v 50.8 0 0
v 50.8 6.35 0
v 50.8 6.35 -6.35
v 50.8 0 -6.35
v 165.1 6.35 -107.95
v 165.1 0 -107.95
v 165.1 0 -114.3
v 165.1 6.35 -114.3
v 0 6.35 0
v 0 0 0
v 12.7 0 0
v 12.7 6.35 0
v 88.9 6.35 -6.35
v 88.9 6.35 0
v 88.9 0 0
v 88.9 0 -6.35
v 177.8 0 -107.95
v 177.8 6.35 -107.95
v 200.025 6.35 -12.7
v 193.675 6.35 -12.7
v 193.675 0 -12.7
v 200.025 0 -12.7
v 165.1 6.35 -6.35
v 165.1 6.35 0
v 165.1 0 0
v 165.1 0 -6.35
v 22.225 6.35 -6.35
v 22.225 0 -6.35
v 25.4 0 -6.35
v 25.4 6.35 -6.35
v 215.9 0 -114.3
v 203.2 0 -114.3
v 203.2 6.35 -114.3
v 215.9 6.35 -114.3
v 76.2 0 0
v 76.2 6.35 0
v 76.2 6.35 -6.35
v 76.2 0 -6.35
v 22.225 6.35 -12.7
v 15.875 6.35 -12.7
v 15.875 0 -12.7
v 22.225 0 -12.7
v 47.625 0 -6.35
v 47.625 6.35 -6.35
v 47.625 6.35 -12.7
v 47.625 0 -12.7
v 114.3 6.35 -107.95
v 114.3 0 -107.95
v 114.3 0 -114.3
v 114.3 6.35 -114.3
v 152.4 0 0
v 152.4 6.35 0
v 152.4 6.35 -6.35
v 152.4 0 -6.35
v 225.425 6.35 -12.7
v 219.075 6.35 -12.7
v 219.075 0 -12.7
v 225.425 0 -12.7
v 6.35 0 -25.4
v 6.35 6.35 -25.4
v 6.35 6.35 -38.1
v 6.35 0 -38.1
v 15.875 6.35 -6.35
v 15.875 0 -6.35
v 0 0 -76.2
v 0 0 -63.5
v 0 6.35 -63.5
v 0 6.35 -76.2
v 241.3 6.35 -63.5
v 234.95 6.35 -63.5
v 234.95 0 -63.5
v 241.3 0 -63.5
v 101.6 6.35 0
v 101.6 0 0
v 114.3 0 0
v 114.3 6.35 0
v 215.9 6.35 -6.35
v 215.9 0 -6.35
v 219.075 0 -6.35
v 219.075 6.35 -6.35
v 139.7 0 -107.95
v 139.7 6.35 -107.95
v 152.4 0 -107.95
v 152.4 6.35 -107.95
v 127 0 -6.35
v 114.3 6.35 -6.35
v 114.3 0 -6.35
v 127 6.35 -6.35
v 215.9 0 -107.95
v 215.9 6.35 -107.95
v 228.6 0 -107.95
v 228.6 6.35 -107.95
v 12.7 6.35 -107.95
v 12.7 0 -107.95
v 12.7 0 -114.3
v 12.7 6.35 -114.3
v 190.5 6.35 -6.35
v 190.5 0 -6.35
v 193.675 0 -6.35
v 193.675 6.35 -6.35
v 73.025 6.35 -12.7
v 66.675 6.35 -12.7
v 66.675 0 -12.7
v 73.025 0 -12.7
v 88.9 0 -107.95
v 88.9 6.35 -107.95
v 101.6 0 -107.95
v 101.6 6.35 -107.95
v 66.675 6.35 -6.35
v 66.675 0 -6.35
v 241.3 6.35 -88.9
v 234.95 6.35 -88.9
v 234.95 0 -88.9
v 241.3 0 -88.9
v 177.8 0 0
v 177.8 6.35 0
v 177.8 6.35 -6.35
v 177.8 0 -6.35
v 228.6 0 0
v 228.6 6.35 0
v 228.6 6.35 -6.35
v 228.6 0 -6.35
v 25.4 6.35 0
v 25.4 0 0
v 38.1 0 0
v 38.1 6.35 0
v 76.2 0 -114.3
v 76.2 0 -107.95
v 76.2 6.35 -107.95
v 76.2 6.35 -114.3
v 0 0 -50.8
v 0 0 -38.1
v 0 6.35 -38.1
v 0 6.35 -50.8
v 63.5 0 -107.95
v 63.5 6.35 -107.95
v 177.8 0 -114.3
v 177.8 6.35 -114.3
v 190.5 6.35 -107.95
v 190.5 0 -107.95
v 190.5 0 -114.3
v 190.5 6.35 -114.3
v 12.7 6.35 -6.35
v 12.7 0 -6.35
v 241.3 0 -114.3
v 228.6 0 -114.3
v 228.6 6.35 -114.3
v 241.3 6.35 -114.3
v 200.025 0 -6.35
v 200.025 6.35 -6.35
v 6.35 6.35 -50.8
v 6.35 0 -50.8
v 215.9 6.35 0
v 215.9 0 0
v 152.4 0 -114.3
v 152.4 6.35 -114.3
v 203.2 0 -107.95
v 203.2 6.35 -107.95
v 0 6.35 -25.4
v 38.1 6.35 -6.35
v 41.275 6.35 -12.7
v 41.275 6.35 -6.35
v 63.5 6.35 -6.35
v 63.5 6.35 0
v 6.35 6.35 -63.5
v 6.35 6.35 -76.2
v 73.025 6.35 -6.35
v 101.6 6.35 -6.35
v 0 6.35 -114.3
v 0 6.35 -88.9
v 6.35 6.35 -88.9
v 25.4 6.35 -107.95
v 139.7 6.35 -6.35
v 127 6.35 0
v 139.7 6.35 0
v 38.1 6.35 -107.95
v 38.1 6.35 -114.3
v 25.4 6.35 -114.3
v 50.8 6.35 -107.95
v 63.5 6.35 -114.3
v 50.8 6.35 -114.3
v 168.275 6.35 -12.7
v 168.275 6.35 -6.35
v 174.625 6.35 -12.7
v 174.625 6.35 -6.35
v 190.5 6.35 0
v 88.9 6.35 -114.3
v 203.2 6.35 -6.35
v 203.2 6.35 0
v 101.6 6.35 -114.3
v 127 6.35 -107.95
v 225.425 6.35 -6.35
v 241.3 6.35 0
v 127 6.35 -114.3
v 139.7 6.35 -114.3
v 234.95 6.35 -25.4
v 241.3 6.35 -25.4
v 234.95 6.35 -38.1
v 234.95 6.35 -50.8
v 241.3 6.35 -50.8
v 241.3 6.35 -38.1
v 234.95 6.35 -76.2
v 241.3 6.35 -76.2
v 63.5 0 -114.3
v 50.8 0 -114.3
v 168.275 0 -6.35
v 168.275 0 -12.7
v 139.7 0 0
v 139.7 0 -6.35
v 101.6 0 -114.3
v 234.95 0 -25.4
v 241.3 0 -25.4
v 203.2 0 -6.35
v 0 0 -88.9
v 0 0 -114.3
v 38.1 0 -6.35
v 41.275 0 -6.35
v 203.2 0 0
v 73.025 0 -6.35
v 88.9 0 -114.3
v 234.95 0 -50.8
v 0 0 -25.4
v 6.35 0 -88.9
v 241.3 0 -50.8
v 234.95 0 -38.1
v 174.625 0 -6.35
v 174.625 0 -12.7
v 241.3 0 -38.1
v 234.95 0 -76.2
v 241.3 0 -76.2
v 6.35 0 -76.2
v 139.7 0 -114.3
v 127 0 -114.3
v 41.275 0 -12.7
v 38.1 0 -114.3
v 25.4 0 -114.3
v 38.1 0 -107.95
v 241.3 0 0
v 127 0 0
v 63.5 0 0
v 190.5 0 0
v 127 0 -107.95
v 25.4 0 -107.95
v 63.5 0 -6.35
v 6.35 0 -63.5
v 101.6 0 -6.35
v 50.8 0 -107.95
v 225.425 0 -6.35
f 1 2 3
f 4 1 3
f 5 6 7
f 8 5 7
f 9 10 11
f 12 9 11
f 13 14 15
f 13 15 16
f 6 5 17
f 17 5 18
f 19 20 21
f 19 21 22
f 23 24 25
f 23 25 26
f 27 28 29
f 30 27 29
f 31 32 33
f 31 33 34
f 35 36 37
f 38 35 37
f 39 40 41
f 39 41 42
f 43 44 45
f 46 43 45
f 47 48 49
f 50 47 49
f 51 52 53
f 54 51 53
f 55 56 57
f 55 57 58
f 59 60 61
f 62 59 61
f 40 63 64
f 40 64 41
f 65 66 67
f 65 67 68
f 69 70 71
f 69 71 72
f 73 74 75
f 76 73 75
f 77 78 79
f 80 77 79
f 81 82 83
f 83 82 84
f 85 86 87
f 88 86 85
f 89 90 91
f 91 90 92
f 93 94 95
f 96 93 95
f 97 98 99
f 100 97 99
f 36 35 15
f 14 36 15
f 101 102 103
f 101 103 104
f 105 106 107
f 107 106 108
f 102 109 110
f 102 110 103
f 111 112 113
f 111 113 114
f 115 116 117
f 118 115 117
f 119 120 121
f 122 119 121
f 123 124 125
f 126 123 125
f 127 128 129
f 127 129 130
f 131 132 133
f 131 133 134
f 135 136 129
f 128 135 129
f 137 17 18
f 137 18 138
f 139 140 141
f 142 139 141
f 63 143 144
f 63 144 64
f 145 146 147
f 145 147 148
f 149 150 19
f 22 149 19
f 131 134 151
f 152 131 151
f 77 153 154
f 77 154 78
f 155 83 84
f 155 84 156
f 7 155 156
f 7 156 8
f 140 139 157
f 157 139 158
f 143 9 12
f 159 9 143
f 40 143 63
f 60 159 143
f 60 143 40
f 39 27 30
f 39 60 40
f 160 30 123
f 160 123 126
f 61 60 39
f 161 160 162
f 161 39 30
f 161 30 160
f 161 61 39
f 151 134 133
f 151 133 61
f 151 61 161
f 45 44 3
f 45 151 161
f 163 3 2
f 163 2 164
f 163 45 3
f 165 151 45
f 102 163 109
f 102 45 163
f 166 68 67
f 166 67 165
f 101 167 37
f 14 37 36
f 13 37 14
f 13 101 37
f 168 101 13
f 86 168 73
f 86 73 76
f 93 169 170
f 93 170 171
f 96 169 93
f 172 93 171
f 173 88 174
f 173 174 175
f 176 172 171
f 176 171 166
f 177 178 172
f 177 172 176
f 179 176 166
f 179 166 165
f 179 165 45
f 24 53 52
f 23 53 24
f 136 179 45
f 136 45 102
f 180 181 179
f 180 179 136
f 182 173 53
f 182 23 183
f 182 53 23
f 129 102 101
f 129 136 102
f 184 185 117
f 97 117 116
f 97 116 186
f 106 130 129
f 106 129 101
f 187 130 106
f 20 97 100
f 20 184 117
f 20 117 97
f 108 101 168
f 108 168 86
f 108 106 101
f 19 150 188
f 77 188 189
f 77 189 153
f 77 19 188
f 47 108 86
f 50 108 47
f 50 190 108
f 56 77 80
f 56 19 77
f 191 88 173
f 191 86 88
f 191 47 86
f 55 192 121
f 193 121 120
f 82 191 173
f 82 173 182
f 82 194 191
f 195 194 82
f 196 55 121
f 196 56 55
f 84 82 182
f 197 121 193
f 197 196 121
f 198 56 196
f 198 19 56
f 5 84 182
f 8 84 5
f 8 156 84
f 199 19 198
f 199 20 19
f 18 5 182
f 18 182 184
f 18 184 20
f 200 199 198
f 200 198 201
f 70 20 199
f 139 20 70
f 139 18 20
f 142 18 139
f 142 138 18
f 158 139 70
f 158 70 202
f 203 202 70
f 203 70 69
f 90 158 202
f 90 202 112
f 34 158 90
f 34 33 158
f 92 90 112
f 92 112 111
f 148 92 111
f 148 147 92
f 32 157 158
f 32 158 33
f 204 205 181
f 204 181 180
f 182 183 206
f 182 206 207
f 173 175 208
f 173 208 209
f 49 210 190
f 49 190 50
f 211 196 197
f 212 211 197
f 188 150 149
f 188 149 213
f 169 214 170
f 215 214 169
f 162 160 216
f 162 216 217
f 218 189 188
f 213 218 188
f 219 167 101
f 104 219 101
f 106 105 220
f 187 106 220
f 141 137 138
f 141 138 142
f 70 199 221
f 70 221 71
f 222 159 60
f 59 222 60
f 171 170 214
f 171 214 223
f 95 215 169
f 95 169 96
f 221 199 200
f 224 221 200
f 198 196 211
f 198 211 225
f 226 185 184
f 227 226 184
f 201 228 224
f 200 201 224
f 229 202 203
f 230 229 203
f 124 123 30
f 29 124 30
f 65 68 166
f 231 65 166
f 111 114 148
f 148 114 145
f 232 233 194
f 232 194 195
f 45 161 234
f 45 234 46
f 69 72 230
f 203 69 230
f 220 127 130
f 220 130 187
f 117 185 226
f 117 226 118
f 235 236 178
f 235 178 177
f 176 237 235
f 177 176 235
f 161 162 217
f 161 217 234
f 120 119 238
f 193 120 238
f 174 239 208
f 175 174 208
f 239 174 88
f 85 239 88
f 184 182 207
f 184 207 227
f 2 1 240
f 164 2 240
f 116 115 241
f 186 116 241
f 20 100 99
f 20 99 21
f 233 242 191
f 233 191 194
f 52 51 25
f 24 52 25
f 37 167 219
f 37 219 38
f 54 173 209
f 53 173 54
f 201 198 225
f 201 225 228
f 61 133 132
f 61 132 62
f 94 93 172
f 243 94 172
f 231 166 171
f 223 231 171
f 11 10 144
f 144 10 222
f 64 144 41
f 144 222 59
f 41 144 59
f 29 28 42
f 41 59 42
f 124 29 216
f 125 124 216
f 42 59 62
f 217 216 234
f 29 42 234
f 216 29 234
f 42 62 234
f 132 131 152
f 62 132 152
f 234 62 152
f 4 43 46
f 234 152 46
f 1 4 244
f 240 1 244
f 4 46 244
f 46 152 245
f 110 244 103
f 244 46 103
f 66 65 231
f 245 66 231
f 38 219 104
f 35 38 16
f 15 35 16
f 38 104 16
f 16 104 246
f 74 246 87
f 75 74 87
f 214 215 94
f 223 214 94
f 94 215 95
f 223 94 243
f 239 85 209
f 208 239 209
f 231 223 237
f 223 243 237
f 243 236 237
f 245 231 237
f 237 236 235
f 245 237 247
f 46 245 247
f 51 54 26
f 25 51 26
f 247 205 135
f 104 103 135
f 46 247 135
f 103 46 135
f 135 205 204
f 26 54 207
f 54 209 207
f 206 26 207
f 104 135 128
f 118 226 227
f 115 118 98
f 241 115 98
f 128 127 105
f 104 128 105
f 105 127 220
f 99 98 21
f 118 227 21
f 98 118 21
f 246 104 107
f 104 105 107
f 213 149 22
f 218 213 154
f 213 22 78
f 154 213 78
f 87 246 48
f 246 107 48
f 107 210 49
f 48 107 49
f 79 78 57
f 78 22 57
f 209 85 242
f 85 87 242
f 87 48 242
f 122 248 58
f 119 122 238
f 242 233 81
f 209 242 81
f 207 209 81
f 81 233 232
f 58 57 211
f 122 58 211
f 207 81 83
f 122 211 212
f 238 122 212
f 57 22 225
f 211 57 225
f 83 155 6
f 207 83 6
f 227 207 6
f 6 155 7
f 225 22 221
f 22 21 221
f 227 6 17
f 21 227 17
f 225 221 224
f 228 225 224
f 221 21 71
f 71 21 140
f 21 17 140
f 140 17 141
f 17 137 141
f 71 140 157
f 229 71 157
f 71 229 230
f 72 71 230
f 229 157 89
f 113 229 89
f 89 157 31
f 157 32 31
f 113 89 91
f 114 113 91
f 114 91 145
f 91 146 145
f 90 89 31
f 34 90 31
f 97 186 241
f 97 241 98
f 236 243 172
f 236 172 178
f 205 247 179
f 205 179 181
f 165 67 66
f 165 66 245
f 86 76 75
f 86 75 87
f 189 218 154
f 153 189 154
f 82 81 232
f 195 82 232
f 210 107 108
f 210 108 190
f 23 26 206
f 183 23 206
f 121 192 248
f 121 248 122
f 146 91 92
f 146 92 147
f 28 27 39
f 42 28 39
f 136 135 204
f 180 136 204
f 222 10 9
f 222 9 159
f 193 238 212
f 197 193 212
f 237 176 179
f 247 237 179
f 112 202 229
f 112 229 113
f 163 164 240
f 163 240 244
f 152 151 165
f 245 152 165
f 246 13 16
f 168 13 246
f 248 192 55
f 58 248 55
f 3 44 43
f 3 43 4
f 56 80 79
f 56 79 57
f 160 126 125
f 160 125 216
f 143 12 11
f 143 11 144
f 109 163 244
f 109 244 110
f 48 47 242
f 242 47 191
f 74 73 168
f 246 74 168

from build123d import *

# Parameters (mm, degrees)
SKETCH1_W           = 241.3
SKETCH1_H           = 114.3
BOSS_EXTRUDE1_DEPTH = 6.35
SKETCH2_W           = 12.7
SKETCH2_H           = 6.35
CUT_EXTRUDE1_DEPTH  = 7.35
SKETCH3_W           = 6.35
SKETCH3_H           = 12.7
CUT_EXTRUDE2_DEPTH  = 7.35
LPATTERN1_COUNT     = 2
LPATTERN1_PITCH     = 25.4
LPATTERN1_COL_COUNT = 2
LPATTERN1_COL_PITCH = 25.4
SKETCH4_W           = 6.35
SKETCH4_H           = 6.35
CUT_EXTRUDE3_DEPTH  = 7.35
LPATTERN2_COUNT     = 9
LPATTERN2_PITCH     = 25.4


with BuildPart() as part:
    # Sketch1 → Boss-Extrude1 (new body)
    with BuildSketch(Plane(origin=(0, 0, 0), x_dir=(1, 0, 0), z_dir=(0, 1, 0))):
        with Locations((120.65, 57.15)):
            Rectangle(SKETCH1_W, SKETCH1_H)
    extrude(amount=BOSS_EXTRUDE1_DEPTH)

    # Sketch2 → Cut-Extrude1 (cut, through all)
    with BuildSketch(Plane(origin=(0, 6.35, 0), x_dir=(1, 0, 0), z_dir=(0, 1, 0))):
        with Locations((19.05, 111.125)):
            Rectangle(SKETCH2_W, SKETCH2_H)
        with Locations((-6.35, 111.125)):
            Rectangle(SKETCH2_W, SKETCH2_H)
        with Locations((-6.35, 3.175)):
            Rectangle(SKETCH2_W, SKETCH2_H)
        with Locations((19.05, 3.175)):
            Rectangle(SKETCH2_W, SKETCH2_H)
        with Locations((44.45, 111.125)):
            Rectangle(SKETCH2_W, SKETCH2_H)
        with Locations((44.45, 3.175)):
            Rectangle(SKETCH2_W, SKETCH2_H)
        with Locations((69.85, 111.125)):
            Rectangle(SKETCH2_W, SKETCH2_H)
        with Locations((69.85, 3.175)):
            Rectangle(SKETCH2_W, SKETCH2_H)
        with Locations((95.25, 111.125)):
            Rectangle(SKETCH2_W, SKETCH2_H)
        with Locations((95.25, 3.175)):
            Rectangle(SKETCH2_W, SKETCH2_H)
        with Locations((120.65, 111.125)):
            Rectangle(SKETCH2_W, SKETCH2_H)
        with Locations((120.65, 3.175)):
            Rectangle(SKETCH2_W, SKETCH2_H)
        with Locations((146.05, 111.125)):
            Rectangle(SKETCH2_W, SKETCH2_H)
        with Locations((146.05, 3.175)):
            Rectangle(SKETCH2_W, SKETCH2_H)
        with Locations((171.45, 111.125)):
            Rectangle(SKETCH2_W, SKETCH2_H)
        with Locations((171.45, 3.175)):
            Rectangle(SKETCH2_W, SKETCH2_H)
        with Locations((196.85, 111.125)):
            Rectangle(SKETCH2_W, SKETCH2_H)
        with Locations((196.85, 3.175)):
            Rectangle(SKETCH2_W, SKETCH2_H)
        with Locations((222.25, 111.125)):
            Rectangle(SKETCH2_W, SKETCH2_H)
        with Locations((222.25, 3.175)):
            Rectangle(SKETCH2_W, SKETCH2_H)
    extrude(amount=-CUT_EXTRUDE1_DEPTH, mode=Mode.SUBTRACT)

    # Sketch3 → Cut-Extrude2 (cut, through all)
    with BuildSketch(Plane(origin=(0, 6.35, 0), x_dir=(1, 0, 0), z_dir=(0, 1, 0))):
        with Locations((3.175, 57.15)):
            Rectangle(SKETCH3_W, SKETCH3_H)
        with Locations((238.125, 57.15)):
            Rectangle(SKETCH3_W, SKETCH3_H)
    cut_extrude2 = extrude(amount=-CUT_EXTRUDE2_DEPTH, mode=Mode.SUBTRACT)

    # LPattern1: Cut-Extrude2 ×2
    with Locations(*[(0, 0, i * LPATTERN1_PITCH) for i in range(1, LPATTERN1_COUNT)]):
        add(cut_extrude2, mode=Mode.SUBTRACT)

    # LPattern1 col: Cut-Extrude2 ×2
    with Locations(*[(0, 0, -i * LPATTERN1_COL_PITCH) for i in range(1, LPATTERN1_COL_COUNT)]):
        add(cut_extrude2, mode=Mode.SUBTRACT)

    # Sketch4 → Cut-Extrude3 (cut, through all)
    with BuildSketch(Plane(origin=(0, 6.35, 0), x_dir=(1, 0, 0), z_dir=(0, 1, 0))):
        with Locations((19.05, 9.525)):
            Rectangle(SKETCH4_W, SKETCH4_H)
    cut_extrude3 = extrude(amount=-CUT_EXTRUDE3_DEPTH, mode=Mode.SUBTRACT)

    # LPattern2: Cut-Extrude3 ×9, 3 skipped
    with Locations(*[(i * LPATTERN2_PITCH, 0, 0) for i in range(1, LPATTERN2_COUNT) if i not in (3, 4, 5)]):
        add(cut_extrude3, mode=Mode.SUBTRACT)


solid = part.part
